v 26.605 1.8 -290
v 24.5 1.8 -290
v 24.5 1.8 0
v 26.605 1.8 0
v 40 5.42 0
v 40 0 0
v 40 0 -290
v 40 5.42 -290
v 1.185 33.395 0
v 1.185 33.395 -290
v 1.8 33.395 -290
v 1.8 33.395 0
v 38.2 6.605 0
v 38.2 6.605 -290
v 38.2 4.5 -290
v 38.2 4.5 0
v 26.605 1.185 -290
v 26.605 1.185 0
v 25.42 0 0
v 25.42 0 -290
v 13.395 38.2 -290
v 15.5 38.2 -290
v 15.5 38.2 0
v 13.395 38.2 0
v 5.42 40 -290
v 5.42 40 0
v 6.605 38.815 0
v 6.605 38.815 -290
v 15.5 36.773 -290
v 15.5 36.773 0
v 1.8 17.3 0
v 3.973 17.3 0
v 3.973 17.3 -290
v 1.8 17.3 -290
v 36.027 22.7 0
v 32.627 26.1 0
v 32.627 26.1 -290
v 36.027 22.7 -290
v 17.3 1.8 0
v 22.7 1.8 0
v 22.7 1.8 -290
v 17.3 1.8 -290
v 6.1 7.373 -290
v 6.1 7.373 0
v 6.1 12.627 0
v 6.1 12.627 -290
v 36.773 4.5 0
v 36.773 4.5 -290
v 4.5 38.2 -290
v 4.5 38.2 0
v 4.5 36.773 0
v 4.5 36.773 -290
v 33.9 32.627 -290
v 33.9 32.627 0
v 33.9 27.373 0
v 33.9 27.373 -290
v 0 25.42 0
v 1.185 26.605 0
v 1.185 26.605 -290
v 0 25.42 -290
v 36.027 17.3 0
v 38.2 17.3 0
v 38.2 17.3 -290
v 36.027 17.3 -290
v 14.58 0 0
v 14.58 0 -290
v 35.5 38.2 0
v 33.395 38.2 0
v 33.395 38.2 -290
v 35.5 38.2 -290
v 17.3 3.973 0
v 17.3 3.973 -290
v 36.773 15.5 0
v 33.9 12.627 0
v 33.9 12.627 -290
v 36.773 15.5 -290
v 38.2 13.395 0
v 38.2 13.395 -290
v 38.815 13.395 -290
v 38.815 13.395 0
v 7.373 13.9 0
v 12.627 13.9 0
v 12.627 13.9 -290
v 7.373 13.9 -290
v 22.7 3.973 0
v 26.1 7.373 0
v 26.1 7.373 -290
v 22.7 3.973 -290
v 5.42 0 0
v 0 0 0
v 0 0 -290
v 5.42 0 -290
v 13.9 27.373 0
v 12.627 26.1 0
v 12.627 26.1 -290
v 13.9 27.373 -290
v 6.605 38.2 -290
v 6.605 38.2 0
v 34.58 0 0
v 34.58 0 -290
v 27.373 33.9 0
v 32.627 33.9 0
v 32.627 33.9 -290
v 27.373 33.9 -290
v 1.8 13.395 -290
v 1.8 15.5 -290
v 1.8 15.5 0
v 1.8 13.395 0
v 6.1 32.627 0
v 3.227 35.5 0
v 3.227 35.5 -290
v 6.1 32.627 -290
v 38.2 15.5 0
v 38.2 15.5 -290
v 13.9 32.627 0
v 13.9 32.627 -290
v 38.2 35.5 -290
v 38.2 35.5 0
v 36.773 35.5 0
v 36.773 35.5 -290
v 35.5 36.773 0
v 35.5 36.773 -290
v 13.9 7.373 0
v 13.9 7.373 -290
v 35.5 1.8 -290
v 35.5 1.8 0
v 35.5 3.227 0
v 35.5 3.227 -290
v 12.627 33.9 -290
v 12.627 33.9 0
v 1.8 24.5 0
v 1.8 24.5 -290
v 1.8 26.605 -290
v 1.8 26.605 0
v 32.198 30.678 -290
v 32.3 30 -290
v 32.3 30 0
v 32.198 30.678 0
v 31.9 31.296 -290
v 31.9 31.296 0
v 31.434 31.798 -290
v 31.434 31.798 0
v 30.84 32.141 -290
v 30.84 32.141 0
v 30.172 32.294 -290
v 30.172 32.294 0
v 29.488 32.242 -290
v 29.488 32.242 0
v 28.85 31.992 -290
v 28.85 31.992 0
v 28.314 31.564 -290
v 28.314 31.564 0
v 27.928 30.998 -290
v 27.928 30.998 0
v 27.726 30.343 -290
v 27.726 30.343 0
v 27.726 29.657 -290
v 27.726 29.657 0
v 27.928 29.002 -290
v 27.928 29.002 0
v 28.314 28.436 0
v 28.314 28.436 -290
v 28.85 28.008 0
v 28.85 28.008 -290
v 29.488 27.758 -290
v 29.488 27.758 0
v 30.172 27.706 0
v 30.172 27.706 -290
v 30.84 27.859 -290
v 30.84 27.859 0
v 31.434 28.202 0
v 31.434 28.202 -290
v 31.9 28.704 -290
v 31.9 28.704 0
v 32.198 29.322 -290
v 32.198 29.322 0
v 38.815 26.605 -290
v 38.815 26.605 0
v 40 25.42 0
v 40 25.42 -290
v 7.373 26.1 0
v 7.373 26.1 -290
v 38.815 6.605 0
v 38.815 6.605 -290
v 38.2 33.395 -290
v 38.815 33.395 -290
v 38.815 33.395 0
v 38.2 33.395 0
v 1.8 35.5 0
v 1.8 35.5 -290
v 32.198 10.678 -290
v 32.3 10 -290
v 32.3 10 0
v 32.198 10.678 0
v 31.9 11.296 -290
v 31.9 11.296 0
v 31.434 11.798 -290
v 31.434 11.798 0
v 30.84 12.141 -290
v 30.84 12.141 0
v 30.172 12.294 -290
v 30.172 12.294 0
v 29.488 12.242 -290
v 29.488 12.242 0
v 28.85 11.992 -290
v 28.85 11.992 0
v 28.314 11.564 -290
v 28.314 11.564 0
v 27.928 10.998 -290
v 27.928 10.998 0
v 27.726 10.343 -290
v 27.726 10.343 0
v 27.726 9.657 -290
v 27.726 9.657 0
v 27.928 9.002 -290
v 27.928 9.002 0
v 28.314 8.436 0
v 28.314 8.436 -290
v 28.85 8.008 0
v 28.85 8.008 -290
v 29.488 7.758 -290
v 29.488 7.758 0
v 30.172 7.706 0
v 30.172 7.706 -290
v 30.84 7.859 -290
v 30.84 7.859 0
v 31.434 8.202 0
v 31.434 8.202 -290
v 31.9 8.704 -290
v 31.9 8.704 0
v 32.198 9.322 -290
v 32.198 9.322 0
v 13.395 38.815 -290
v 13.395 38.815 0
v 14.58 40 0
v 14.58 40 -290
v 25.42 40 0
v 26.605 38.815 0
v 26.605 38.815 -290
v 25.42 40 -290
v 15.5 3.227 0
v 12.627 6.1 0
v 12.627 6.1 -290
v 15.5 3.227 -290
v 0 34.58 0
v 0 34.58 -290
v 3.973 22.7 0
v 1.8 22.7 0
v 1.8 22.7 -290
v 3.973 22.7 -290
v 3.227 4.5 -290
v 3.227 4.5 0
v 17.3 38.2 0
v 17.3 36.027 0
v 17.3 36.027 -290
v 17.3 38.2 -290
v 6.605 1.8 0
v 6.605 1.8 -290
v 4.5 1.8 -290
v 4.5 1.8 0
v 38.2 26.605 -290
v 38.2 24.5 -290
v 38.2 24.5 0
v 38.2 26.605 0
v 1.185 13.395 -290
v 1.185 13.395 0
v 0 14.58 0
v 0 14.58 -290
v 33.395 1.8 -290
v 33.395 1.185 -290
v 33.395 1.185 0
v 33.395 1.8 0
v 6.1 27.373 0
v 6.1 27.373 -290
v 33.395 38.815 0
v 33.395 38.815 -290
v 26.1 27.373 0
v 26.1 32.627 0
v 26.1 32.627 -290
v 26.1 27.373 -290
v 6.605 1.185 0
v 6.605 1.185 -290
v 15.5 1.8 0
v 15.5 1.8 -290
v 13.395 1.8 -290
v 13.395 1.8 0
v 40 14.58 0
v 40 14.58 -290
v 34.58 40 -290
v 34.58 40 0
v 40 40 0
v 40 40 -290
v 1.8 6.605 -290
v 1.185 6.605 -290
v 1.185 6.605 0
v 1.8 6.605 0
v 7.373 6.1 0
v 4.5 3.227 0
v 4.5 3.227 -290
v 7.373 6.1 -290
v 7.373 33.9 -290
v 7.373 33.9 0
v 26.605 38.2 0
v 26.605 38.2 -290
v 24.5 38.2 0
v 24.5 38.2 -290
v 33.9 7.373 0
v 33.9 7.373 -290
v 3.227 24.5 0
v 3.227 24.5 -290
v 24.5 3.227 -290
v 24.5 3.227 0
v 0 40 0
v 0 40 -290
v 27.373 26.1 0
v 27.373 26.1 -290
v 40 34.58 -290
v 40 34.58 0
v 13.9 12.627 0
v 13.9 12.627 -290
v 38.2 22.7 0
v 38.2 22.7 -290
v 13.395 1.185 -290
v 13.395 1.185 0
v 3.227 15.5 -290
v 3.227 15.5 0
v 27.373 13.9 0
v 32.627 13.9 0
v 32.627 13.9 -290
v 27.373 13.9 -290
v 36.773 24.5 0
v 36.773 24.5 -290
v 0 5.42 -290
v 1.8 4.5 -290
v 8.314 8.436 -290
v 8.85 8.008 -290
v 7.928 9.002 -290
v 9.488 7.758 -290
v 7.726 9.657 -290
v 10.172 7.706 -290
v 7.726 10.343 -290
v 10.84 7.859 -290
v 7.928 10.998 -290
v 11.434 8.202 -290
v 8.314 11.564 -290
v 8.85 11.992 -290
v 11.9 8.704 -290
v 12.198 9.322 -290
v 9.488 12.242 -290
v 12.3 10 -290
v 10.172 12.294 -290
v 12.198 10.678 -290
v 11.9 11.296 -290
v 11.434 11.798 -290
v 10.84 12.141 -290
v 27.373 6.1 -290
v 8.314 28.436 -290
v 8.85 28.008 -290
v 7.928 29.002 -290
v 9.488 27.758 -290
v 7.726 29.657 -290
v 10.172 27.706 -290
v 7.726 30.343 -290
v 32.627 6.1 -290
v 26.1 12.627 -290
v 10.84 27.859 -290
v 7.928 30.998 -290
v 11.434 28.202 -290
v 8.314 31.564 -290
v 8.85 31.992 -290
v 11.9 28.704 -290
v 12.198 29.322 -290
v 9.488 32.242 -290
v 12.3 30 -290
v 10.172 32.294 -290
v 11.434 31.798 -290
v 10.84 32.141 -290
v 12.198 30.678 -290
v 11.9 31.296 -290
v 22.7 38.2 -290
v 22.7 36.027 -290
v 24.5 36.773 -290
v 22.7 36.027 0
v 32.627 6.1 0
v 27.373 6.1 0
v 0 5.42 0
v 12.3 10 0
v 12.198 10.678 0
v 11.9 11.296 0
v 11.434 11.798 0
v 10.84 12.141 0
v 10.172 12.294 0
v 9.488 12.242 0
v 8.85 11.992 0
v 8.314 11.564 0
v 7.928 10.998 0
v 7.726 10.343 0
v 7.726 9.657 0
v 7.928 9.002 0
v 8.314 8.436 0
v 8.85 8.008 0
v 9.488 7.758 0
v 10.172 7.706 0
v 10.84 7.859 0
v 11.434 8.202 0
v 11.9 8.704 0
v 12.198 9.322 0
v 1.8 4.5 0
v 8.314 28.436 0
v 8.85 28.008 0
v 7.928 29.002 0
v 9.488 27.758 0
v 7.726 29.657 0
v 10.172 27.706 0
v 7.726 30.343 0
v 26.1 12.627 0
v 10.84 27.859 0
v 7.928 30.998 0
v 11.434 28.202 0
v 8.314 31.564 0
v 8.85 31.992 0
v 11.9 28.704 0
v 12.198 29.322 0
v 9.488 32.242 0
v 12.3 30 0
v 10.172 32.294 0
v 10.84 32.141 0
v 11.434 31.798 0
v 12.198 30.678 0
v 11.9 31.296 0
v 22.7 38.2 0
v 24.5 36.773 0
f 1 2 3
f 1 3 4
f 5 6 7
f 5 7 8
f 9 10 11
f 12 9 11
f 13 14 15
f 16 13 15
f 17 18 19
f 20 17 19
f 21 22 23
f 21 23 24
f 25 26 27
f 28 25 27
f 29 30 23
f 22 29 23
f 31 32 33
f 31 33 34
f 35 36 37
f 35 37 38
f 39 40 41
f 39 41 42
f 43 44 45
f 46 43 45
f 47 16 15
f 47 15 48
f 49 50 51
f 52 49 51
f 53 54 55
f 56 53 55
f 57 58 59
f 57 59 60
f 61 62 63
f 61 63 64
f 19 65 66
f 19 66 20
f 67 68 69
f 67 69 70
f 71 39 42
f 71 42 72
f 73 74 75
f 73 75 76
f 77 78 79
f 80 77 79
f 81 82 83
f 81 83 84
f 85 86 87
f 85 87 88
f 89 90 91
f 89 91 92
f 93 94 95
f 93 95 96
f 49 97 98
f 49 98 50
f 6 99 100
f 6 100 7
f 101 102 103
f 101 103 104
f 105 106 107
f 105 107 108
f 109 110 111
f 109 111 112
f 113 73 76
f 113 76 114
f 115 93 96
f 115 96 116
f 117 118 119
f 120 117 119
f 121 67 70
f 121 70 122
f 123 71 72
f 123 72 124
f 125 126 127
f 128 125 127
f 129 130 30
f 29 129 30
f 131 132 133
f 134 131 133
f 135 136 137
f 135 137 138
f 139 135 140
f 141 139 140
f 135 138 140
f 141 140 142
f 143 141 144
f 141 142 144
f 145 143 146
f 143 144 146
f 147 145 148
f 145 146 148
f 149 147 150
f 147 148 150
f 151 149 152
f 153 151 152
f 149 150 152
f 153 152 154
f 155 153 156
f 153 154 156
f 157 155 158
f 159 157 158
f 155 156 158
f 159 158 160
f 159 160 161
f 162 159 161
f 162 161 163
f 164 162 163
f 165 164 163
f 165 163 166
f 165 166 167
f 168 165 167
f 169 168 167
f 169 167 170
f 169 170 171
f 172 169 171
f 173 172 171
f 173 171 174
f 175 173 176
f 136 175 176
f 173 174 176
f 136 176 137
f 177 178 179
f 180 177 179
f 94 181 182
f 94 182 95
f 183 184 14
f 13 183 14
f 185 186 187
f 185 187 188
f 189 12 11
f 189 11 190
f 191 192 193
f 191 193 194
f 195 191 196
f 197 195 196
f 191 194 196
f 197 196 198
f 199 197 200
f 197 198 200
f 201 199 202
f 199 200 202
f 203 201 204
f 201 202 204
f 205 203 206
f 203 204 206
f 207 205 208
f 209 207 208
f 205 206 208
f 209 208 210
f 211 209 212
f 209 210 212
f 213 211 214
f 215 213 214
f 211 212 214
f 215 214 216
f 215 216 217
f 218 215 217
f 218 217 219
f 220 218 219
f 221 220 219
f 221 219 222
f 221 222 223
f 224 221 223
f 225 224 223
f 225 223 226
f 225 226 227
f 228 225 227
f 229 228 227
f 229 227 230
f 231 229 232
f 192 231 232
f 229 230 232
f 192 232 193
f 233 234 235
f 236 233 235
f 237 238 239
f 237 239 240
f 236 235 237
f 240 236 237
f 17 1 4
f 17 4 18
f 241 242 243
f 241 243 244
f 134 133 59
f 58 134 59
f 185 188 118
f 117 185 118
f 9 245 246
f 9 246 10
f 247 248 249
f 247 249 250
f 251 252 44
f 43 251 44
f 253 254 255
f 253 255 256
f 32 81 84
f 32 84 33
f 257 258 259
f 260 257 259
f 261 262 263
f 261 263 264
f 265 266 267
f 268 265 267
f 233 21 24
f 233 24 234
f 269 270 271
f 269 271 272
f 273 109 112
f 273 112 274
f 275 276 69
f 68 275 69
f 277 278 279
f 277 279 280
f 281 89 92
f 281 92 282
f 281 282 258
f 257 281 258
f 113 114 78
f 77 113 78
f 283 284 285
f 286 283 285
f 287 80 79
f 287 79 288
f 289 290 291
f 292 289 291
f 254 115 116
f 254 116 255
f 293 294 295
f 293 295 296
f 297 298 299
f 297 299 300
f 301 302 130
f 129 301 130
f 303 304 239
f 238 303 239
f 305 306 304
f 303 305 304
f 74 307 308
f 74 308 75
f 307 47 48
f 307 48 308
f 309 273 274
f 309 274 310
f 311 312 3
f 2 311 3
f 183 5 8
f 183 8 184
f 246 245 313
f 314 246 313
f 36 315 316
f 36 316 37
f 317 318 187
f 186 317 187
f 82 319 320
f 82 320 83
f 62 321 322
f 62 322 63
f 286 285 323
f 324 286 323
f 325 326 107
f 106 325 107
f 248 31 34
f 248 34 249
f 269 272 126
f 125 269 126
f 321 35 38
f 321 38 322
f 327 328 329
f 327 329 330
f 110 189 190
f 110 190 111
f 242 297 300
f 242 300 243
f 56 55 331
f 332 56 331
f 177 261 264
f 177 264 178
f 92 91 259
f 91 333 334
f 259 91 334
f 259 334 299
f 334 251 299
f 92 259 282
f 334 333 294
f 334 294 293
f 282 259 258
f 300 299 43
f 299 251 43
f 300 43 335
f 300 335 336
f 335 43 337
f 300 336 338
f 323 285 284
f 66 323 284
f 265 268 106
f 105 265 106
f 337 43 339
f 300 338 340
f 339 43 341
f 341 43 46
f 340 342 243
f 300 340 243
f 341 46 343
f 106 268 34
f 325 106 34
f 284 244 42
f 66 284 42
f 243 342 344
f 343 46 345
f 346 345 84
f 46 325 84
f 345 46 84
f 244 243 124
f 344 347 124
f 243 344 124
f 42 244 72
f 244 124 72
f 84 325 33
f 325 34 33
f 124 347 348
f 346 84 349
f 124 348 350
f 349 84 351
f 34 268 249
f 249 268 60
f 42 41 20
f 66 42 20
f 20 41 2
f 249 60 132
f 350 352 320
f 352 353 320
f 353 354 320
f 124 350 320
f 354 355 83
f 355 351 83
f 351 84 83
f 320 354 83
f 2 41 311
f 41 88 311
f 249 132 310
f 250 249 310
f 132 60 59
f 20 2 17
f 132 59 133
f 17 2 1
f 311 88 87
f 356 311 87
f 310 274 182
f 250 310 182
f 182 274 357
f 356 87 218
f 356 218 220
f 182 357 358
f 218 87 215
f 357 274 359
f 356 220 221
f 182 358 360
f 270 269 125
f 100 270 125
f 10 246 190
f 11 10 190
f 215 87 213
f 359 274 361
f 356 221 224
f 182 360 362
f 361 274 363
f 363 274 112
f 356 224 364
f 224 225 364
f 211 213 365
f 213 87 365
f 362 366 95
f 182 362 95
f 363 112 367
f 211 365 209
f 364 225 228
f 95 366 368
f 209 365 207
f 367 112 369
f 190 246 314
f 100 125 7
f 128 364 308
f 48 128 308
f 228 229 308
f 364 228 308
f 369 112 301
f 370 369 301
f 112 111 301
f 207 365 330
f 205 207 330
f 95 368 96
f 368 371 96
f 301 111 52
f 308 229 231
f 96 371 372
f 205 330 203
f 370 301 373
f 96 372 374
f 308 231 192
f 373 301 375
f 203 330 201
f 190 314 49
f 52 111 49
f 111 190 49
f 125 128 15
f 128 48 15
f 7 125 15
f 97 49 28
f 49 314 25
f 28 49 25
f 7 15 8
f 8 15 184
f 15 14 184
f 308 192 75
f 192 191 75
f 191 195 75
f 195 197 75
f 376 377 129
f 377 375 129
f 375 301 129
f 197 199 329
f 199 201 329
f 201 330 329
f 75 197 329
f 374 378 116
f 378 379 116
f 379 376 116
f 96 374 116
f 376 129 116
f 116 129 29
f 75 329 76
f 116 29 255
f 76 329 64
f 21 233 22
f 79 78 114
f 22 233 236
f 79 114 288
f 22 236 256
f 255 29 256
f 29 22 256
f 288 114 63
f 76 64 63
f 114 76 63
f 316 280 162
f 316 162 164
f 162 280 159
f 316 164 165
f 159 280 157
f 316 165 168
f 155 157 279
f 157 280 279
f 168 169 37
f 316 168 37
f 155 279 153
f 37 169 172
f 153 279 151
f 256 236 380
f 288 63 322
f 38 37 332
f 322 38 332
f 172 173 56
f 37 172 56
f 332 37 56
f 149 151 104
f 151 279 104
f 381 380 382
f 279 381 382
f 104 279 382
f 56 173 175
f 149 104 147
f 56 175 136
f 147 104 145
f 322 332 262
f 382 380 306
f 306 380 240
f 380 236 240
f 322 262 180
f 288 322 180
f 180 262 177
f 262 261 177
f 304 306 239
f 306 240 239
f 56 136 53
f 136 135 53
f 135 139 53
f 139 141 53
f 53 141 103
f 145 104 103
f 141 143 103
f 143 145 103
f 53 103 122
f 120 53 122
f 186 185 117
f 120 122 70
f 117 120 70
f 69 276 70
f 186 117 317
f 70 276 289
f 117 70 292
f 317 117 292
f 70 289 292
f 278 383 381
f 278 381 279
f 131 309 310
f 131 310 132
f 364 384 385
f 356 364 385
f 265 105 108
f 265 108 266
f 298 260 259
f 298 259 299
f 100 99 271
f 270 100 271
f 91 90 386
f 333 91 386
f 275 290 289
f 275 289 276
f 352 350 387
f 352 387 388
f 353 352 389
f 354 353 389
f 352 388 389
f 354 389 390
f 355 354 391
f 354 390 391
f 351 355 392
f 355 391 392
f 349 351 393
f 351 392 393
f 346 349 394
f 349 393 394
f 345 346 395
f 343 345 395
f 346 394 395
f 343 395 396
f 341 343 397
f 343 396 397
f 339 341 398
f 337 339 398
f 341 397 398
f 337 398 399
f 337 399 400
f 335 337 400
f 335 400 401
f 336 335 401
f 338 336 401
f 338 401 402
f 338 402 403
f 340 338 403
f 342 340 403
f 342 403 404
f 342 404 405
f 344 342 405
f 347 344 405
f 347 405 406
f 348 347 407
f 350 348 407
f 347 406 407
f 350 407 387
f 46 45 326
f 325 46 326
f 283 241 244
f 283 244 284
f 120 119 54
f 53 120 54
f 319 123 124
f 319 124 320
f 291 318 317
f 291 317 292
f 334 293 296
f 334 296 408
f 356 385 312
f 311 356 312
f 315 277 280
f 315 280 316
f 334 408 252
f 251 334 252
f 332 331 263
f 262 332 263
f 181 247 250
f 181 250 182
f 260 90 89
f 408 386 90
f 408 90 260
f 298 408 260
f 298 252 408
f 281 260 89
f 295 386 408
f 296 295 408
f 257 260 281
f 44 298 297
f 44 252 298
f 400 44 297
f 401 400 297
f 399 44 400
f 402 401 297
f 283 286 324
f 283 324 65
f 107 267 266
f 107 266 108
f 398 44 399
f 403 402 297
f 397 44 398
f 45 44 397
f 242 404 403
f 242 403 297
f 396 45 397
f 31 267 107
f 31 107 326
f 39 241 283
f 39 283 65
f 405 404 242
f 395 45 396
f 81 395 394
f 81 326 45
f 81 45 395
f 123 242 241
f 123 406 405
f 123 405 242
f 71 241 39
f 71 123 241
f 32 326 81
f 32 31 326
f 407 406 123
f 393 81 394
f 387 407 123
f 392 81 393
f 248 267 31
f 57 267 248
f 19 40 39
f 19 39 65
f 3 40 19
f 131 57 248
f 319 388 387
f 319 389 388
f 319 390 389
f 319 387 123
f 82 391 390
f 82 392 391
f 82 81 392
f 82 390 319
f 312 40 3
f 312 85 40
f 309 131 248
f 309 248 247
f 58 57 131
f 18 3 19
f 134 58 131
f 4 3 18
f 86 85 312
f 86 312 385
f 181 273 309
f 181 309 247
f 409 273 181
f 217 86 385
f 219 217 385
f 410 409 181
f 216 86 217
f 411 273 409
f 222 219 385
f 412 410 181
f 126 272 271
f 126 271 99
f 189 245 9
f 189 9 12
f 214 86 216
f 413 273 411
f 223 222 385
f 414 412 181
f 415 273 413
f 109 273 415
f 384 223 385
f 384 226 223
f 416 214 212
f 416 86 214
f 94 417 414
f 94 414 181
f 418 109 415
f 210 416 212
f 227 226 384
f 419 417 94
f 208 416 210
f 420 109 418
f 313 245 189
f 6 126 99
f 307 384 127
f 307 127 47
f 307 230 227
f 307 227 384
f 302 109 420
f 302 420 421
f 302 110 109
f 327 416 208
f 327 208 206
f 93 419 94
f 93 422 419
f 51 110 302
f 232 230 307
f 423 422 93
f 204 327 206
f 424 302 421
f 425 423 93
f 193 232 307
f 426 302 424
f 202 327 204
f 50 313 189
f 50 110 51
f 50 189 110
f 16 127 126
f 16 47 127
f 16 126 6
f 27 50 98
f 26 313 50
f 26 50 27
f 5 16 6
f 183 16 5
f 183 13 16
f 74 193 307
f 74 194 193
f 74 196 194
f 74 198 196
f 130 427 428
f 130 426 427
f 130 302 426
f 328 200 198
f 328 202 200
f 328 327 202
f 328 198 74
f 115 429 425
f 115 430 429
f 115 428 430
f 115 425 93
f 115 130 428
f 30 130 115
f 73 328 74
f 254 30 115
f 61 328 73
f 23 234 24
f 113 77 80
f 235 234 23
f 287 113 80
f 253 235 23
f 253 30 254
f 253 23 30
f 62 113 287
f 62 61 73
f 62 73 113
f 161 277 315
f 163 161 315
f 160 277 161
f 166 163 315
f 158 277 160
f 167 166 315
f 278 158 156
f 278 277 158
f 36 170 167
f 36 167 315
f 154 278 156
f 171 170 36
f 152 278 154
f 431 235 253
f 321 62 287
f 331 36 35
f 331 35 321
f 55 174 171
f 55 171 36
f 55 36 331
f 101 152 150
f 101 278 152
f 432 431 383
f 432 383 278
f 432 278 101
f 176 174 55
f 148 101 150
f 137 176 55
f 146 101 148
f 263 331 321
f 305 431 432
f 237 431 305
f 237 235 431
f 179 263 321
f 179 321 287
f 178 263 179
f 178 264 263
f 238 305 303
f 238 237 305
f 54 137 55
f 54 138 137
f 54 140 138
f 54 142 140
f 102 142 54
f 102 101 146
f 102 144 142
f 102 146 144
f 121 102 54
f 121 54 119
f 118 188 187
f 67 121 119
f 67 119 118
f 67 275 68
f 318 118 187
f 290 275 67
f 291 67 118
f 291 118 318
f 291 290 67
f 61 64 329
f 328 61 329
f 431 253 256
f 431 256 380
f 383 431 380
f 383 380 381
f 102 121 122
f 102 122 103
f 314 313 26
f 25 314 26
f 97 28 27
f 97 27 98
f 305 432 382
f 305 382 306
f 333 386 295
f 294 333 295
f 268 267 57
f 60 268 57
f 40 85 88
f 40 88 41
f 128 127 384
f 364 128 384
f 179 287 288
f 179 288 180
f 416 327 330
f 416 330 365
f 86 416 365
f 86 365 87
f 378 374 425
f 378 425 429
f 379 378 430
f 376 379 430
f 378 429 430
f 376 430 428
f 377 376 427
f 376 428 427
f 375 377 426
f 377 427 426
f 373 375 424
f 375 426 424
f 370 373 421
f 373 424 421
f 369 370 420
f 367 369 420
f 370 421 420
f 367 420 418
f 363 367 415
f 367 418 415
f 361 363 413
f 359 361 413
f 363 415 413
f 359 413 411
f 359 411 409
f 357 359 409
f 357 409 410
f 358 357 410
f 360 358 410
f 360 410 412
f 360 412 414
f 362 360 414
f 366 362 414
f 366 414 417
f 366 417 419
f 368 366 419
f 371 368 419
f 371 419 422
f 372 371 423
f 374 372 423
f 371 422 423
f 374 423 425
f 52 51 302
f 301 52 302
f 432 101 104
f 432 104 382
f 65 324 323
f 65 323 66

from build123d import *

# Parameters (mm, degrees)
SKETCH1_W           = 40
SKETCH1_H           = 40
BOSS_EXTRUDE1_DEPTH = 290
SKETCH2_R           = 2.3
CUT_EXTRUDE1_DEPTH  = 290
CUT_EXTRUDE2_DEPTH  = 290


with BuildPart() as part:
    # Sketch1 → Boss-Extrude1 (new body)
    with BuildSketch(Plane.XY):
        with Locations((20, 20)):
            Rectangle(SKETCH1_W, SKETCH1_H)
    extrude(amount=-BOSS_EXTRUDE1_DEPTH)

    # Sketch2 → Cut-Extrude1 (cut)
    with BuildSketch(Plane.XY):
        with Locations((10, 30)):
            Circle(SKETCH2_R)
        with Locations((30, 30)):
            Circle(SKETCH2_R)
        with Locations((30, 10)):
            Circle(SKETCH2_R)
        with Locations((10, 10)):
            Circle(SKETCH2_R)
        Polygon((6.605, 38.815), (6.605, 38.2), (4.5, 38.2), (4.5, 36.772792206), (7.372792206, 33.9), (12.627207794, 33.9), (15.5, 36.772792206), (15.5, 38.2), (13.395, 38.2), (13.395, 38.815), (14.58, 40), (5.42, 40), align=None)
        Polygon((26.605, 38.815), (25.42, 40), (34.58, 40), (33.395, 38.815), (33.395, 38.2), (35.5, 38.2), (35.5, 36.772792206), (32.627207794, 33.9), (27.372792206, 33.9), (24.5, 36.772792206), (24.5, 38.2), (26.605, 38.2), align=None)
        Polygon((26.605, 1.8), (26.605, 1.185), (25.42, 0), (34.58, 0), (33.395, 1.185), (33.395, 1.8), (35.5, 1.8), (35.5, 3.227207794), (32.627207794, 6.1), (27.372792206, 6.1), (24.5, 3.227207794), (24.5, 1.8), align=None)
        Polygon((13.395, 1.185), (14.58, 0), (5.42, 0), (6.605, 1.185), (6.605, 1.8), (4.5, 1.8), (4.5, 3.227207794), (7.372792206, 6.1), (12.627207794, 6.1), (15.5, 3.227207794), (15.5, 1.8), (13.395, 1.8), align=None)
        Polygon((1.8, 13.395), (1.185, 13.395), (0, 14.58), (0, 5.42), (1.185, 6.605), (1.8, 6.605), (1.8, 4.5), (3.227207794, 4.5), (6.1, 7.372792206), (6.1, 12.627207794), (3.227207794, 15.5), (1.8, 15.5), align=None)
        Polygon((1.185, 26.605), (0, 25.42), (0, 34.58), (1.185, 33.395), (1.8, 33.395), (1.8, 35.5), (3.227207794, 35.5), (6.1, 32.627207794), (6.1, 27.372792206), (3.227207794, 24.5), (1.8, 24.5), (1.8, 26.605), align=None)
        Polygon((38.2, 15.5), (38.2, 13.395), (38.815, 13.395), (40, 14.58), (40, 5.42), (38.815, 6.605), (38.2, 6.605), (38.2, 4.5), (36.772792206, 4.5), (33.9, 7.372792206), (33.9, 12.627207794), (36.772792206, 15.5), align=None)
        Polygon((38.2, 26.605), (38.815, 26.605), (40, 25.42), (40, 34.58), (38.815, 33.395), (38.2, 33.395), (38.2, 35.5), (36.772792206, 35.5), (33.9, 32.627207794), (33.9, 27.372792206), (36.772792206, 24.5), (38.2, 24.5), align=None)
    extrude(amount=-CUT_EXTRUDE1_DEPTH, mode=Mode.SUBTRACT)

    # Sketch3 → Cut-Extrude2 (cut)
    with BuildSketch(Plane.XY):
        Polygon((17.3, 38.2), (22.7, 38.2), (22.7, 36.027207794), (26.1, 32.627207794), (26.1, 27.372792206), (27.372792206, 26.1), (32.627207794, 26.1), (36.027207794, 22.7), (38.2, 22.7), (38.2, 17.3), (36.027207794, 17.3), (32.627207794, 13.9), (27.372792206, 13.9), (26.1, 12.627207794), (26.1, 7.372792206), (22.7, 3.972792206), (22.7, 1.8), (17.3, 1.8), (17.3, 3.972792206), (13.9, 7.372792206), (13.9, 12.627207794), (12.627207794, 13.9), (7.372792206, 13.9), (3.972792206, 17.3), (1.8, 17.3), (1.8, 22.7), (3.972792206, 22.7), (7.372792206, 26.1), (12.627207794, 26.1), (13.9, 27.372792206), (13.9, 32.627207794), (17.3, 36.027207794), align=None)
    extrude(amount=-CUT_EXTRUDE2_DEPTH, mode=Mode.SUBTRACT)


solid = part.part
